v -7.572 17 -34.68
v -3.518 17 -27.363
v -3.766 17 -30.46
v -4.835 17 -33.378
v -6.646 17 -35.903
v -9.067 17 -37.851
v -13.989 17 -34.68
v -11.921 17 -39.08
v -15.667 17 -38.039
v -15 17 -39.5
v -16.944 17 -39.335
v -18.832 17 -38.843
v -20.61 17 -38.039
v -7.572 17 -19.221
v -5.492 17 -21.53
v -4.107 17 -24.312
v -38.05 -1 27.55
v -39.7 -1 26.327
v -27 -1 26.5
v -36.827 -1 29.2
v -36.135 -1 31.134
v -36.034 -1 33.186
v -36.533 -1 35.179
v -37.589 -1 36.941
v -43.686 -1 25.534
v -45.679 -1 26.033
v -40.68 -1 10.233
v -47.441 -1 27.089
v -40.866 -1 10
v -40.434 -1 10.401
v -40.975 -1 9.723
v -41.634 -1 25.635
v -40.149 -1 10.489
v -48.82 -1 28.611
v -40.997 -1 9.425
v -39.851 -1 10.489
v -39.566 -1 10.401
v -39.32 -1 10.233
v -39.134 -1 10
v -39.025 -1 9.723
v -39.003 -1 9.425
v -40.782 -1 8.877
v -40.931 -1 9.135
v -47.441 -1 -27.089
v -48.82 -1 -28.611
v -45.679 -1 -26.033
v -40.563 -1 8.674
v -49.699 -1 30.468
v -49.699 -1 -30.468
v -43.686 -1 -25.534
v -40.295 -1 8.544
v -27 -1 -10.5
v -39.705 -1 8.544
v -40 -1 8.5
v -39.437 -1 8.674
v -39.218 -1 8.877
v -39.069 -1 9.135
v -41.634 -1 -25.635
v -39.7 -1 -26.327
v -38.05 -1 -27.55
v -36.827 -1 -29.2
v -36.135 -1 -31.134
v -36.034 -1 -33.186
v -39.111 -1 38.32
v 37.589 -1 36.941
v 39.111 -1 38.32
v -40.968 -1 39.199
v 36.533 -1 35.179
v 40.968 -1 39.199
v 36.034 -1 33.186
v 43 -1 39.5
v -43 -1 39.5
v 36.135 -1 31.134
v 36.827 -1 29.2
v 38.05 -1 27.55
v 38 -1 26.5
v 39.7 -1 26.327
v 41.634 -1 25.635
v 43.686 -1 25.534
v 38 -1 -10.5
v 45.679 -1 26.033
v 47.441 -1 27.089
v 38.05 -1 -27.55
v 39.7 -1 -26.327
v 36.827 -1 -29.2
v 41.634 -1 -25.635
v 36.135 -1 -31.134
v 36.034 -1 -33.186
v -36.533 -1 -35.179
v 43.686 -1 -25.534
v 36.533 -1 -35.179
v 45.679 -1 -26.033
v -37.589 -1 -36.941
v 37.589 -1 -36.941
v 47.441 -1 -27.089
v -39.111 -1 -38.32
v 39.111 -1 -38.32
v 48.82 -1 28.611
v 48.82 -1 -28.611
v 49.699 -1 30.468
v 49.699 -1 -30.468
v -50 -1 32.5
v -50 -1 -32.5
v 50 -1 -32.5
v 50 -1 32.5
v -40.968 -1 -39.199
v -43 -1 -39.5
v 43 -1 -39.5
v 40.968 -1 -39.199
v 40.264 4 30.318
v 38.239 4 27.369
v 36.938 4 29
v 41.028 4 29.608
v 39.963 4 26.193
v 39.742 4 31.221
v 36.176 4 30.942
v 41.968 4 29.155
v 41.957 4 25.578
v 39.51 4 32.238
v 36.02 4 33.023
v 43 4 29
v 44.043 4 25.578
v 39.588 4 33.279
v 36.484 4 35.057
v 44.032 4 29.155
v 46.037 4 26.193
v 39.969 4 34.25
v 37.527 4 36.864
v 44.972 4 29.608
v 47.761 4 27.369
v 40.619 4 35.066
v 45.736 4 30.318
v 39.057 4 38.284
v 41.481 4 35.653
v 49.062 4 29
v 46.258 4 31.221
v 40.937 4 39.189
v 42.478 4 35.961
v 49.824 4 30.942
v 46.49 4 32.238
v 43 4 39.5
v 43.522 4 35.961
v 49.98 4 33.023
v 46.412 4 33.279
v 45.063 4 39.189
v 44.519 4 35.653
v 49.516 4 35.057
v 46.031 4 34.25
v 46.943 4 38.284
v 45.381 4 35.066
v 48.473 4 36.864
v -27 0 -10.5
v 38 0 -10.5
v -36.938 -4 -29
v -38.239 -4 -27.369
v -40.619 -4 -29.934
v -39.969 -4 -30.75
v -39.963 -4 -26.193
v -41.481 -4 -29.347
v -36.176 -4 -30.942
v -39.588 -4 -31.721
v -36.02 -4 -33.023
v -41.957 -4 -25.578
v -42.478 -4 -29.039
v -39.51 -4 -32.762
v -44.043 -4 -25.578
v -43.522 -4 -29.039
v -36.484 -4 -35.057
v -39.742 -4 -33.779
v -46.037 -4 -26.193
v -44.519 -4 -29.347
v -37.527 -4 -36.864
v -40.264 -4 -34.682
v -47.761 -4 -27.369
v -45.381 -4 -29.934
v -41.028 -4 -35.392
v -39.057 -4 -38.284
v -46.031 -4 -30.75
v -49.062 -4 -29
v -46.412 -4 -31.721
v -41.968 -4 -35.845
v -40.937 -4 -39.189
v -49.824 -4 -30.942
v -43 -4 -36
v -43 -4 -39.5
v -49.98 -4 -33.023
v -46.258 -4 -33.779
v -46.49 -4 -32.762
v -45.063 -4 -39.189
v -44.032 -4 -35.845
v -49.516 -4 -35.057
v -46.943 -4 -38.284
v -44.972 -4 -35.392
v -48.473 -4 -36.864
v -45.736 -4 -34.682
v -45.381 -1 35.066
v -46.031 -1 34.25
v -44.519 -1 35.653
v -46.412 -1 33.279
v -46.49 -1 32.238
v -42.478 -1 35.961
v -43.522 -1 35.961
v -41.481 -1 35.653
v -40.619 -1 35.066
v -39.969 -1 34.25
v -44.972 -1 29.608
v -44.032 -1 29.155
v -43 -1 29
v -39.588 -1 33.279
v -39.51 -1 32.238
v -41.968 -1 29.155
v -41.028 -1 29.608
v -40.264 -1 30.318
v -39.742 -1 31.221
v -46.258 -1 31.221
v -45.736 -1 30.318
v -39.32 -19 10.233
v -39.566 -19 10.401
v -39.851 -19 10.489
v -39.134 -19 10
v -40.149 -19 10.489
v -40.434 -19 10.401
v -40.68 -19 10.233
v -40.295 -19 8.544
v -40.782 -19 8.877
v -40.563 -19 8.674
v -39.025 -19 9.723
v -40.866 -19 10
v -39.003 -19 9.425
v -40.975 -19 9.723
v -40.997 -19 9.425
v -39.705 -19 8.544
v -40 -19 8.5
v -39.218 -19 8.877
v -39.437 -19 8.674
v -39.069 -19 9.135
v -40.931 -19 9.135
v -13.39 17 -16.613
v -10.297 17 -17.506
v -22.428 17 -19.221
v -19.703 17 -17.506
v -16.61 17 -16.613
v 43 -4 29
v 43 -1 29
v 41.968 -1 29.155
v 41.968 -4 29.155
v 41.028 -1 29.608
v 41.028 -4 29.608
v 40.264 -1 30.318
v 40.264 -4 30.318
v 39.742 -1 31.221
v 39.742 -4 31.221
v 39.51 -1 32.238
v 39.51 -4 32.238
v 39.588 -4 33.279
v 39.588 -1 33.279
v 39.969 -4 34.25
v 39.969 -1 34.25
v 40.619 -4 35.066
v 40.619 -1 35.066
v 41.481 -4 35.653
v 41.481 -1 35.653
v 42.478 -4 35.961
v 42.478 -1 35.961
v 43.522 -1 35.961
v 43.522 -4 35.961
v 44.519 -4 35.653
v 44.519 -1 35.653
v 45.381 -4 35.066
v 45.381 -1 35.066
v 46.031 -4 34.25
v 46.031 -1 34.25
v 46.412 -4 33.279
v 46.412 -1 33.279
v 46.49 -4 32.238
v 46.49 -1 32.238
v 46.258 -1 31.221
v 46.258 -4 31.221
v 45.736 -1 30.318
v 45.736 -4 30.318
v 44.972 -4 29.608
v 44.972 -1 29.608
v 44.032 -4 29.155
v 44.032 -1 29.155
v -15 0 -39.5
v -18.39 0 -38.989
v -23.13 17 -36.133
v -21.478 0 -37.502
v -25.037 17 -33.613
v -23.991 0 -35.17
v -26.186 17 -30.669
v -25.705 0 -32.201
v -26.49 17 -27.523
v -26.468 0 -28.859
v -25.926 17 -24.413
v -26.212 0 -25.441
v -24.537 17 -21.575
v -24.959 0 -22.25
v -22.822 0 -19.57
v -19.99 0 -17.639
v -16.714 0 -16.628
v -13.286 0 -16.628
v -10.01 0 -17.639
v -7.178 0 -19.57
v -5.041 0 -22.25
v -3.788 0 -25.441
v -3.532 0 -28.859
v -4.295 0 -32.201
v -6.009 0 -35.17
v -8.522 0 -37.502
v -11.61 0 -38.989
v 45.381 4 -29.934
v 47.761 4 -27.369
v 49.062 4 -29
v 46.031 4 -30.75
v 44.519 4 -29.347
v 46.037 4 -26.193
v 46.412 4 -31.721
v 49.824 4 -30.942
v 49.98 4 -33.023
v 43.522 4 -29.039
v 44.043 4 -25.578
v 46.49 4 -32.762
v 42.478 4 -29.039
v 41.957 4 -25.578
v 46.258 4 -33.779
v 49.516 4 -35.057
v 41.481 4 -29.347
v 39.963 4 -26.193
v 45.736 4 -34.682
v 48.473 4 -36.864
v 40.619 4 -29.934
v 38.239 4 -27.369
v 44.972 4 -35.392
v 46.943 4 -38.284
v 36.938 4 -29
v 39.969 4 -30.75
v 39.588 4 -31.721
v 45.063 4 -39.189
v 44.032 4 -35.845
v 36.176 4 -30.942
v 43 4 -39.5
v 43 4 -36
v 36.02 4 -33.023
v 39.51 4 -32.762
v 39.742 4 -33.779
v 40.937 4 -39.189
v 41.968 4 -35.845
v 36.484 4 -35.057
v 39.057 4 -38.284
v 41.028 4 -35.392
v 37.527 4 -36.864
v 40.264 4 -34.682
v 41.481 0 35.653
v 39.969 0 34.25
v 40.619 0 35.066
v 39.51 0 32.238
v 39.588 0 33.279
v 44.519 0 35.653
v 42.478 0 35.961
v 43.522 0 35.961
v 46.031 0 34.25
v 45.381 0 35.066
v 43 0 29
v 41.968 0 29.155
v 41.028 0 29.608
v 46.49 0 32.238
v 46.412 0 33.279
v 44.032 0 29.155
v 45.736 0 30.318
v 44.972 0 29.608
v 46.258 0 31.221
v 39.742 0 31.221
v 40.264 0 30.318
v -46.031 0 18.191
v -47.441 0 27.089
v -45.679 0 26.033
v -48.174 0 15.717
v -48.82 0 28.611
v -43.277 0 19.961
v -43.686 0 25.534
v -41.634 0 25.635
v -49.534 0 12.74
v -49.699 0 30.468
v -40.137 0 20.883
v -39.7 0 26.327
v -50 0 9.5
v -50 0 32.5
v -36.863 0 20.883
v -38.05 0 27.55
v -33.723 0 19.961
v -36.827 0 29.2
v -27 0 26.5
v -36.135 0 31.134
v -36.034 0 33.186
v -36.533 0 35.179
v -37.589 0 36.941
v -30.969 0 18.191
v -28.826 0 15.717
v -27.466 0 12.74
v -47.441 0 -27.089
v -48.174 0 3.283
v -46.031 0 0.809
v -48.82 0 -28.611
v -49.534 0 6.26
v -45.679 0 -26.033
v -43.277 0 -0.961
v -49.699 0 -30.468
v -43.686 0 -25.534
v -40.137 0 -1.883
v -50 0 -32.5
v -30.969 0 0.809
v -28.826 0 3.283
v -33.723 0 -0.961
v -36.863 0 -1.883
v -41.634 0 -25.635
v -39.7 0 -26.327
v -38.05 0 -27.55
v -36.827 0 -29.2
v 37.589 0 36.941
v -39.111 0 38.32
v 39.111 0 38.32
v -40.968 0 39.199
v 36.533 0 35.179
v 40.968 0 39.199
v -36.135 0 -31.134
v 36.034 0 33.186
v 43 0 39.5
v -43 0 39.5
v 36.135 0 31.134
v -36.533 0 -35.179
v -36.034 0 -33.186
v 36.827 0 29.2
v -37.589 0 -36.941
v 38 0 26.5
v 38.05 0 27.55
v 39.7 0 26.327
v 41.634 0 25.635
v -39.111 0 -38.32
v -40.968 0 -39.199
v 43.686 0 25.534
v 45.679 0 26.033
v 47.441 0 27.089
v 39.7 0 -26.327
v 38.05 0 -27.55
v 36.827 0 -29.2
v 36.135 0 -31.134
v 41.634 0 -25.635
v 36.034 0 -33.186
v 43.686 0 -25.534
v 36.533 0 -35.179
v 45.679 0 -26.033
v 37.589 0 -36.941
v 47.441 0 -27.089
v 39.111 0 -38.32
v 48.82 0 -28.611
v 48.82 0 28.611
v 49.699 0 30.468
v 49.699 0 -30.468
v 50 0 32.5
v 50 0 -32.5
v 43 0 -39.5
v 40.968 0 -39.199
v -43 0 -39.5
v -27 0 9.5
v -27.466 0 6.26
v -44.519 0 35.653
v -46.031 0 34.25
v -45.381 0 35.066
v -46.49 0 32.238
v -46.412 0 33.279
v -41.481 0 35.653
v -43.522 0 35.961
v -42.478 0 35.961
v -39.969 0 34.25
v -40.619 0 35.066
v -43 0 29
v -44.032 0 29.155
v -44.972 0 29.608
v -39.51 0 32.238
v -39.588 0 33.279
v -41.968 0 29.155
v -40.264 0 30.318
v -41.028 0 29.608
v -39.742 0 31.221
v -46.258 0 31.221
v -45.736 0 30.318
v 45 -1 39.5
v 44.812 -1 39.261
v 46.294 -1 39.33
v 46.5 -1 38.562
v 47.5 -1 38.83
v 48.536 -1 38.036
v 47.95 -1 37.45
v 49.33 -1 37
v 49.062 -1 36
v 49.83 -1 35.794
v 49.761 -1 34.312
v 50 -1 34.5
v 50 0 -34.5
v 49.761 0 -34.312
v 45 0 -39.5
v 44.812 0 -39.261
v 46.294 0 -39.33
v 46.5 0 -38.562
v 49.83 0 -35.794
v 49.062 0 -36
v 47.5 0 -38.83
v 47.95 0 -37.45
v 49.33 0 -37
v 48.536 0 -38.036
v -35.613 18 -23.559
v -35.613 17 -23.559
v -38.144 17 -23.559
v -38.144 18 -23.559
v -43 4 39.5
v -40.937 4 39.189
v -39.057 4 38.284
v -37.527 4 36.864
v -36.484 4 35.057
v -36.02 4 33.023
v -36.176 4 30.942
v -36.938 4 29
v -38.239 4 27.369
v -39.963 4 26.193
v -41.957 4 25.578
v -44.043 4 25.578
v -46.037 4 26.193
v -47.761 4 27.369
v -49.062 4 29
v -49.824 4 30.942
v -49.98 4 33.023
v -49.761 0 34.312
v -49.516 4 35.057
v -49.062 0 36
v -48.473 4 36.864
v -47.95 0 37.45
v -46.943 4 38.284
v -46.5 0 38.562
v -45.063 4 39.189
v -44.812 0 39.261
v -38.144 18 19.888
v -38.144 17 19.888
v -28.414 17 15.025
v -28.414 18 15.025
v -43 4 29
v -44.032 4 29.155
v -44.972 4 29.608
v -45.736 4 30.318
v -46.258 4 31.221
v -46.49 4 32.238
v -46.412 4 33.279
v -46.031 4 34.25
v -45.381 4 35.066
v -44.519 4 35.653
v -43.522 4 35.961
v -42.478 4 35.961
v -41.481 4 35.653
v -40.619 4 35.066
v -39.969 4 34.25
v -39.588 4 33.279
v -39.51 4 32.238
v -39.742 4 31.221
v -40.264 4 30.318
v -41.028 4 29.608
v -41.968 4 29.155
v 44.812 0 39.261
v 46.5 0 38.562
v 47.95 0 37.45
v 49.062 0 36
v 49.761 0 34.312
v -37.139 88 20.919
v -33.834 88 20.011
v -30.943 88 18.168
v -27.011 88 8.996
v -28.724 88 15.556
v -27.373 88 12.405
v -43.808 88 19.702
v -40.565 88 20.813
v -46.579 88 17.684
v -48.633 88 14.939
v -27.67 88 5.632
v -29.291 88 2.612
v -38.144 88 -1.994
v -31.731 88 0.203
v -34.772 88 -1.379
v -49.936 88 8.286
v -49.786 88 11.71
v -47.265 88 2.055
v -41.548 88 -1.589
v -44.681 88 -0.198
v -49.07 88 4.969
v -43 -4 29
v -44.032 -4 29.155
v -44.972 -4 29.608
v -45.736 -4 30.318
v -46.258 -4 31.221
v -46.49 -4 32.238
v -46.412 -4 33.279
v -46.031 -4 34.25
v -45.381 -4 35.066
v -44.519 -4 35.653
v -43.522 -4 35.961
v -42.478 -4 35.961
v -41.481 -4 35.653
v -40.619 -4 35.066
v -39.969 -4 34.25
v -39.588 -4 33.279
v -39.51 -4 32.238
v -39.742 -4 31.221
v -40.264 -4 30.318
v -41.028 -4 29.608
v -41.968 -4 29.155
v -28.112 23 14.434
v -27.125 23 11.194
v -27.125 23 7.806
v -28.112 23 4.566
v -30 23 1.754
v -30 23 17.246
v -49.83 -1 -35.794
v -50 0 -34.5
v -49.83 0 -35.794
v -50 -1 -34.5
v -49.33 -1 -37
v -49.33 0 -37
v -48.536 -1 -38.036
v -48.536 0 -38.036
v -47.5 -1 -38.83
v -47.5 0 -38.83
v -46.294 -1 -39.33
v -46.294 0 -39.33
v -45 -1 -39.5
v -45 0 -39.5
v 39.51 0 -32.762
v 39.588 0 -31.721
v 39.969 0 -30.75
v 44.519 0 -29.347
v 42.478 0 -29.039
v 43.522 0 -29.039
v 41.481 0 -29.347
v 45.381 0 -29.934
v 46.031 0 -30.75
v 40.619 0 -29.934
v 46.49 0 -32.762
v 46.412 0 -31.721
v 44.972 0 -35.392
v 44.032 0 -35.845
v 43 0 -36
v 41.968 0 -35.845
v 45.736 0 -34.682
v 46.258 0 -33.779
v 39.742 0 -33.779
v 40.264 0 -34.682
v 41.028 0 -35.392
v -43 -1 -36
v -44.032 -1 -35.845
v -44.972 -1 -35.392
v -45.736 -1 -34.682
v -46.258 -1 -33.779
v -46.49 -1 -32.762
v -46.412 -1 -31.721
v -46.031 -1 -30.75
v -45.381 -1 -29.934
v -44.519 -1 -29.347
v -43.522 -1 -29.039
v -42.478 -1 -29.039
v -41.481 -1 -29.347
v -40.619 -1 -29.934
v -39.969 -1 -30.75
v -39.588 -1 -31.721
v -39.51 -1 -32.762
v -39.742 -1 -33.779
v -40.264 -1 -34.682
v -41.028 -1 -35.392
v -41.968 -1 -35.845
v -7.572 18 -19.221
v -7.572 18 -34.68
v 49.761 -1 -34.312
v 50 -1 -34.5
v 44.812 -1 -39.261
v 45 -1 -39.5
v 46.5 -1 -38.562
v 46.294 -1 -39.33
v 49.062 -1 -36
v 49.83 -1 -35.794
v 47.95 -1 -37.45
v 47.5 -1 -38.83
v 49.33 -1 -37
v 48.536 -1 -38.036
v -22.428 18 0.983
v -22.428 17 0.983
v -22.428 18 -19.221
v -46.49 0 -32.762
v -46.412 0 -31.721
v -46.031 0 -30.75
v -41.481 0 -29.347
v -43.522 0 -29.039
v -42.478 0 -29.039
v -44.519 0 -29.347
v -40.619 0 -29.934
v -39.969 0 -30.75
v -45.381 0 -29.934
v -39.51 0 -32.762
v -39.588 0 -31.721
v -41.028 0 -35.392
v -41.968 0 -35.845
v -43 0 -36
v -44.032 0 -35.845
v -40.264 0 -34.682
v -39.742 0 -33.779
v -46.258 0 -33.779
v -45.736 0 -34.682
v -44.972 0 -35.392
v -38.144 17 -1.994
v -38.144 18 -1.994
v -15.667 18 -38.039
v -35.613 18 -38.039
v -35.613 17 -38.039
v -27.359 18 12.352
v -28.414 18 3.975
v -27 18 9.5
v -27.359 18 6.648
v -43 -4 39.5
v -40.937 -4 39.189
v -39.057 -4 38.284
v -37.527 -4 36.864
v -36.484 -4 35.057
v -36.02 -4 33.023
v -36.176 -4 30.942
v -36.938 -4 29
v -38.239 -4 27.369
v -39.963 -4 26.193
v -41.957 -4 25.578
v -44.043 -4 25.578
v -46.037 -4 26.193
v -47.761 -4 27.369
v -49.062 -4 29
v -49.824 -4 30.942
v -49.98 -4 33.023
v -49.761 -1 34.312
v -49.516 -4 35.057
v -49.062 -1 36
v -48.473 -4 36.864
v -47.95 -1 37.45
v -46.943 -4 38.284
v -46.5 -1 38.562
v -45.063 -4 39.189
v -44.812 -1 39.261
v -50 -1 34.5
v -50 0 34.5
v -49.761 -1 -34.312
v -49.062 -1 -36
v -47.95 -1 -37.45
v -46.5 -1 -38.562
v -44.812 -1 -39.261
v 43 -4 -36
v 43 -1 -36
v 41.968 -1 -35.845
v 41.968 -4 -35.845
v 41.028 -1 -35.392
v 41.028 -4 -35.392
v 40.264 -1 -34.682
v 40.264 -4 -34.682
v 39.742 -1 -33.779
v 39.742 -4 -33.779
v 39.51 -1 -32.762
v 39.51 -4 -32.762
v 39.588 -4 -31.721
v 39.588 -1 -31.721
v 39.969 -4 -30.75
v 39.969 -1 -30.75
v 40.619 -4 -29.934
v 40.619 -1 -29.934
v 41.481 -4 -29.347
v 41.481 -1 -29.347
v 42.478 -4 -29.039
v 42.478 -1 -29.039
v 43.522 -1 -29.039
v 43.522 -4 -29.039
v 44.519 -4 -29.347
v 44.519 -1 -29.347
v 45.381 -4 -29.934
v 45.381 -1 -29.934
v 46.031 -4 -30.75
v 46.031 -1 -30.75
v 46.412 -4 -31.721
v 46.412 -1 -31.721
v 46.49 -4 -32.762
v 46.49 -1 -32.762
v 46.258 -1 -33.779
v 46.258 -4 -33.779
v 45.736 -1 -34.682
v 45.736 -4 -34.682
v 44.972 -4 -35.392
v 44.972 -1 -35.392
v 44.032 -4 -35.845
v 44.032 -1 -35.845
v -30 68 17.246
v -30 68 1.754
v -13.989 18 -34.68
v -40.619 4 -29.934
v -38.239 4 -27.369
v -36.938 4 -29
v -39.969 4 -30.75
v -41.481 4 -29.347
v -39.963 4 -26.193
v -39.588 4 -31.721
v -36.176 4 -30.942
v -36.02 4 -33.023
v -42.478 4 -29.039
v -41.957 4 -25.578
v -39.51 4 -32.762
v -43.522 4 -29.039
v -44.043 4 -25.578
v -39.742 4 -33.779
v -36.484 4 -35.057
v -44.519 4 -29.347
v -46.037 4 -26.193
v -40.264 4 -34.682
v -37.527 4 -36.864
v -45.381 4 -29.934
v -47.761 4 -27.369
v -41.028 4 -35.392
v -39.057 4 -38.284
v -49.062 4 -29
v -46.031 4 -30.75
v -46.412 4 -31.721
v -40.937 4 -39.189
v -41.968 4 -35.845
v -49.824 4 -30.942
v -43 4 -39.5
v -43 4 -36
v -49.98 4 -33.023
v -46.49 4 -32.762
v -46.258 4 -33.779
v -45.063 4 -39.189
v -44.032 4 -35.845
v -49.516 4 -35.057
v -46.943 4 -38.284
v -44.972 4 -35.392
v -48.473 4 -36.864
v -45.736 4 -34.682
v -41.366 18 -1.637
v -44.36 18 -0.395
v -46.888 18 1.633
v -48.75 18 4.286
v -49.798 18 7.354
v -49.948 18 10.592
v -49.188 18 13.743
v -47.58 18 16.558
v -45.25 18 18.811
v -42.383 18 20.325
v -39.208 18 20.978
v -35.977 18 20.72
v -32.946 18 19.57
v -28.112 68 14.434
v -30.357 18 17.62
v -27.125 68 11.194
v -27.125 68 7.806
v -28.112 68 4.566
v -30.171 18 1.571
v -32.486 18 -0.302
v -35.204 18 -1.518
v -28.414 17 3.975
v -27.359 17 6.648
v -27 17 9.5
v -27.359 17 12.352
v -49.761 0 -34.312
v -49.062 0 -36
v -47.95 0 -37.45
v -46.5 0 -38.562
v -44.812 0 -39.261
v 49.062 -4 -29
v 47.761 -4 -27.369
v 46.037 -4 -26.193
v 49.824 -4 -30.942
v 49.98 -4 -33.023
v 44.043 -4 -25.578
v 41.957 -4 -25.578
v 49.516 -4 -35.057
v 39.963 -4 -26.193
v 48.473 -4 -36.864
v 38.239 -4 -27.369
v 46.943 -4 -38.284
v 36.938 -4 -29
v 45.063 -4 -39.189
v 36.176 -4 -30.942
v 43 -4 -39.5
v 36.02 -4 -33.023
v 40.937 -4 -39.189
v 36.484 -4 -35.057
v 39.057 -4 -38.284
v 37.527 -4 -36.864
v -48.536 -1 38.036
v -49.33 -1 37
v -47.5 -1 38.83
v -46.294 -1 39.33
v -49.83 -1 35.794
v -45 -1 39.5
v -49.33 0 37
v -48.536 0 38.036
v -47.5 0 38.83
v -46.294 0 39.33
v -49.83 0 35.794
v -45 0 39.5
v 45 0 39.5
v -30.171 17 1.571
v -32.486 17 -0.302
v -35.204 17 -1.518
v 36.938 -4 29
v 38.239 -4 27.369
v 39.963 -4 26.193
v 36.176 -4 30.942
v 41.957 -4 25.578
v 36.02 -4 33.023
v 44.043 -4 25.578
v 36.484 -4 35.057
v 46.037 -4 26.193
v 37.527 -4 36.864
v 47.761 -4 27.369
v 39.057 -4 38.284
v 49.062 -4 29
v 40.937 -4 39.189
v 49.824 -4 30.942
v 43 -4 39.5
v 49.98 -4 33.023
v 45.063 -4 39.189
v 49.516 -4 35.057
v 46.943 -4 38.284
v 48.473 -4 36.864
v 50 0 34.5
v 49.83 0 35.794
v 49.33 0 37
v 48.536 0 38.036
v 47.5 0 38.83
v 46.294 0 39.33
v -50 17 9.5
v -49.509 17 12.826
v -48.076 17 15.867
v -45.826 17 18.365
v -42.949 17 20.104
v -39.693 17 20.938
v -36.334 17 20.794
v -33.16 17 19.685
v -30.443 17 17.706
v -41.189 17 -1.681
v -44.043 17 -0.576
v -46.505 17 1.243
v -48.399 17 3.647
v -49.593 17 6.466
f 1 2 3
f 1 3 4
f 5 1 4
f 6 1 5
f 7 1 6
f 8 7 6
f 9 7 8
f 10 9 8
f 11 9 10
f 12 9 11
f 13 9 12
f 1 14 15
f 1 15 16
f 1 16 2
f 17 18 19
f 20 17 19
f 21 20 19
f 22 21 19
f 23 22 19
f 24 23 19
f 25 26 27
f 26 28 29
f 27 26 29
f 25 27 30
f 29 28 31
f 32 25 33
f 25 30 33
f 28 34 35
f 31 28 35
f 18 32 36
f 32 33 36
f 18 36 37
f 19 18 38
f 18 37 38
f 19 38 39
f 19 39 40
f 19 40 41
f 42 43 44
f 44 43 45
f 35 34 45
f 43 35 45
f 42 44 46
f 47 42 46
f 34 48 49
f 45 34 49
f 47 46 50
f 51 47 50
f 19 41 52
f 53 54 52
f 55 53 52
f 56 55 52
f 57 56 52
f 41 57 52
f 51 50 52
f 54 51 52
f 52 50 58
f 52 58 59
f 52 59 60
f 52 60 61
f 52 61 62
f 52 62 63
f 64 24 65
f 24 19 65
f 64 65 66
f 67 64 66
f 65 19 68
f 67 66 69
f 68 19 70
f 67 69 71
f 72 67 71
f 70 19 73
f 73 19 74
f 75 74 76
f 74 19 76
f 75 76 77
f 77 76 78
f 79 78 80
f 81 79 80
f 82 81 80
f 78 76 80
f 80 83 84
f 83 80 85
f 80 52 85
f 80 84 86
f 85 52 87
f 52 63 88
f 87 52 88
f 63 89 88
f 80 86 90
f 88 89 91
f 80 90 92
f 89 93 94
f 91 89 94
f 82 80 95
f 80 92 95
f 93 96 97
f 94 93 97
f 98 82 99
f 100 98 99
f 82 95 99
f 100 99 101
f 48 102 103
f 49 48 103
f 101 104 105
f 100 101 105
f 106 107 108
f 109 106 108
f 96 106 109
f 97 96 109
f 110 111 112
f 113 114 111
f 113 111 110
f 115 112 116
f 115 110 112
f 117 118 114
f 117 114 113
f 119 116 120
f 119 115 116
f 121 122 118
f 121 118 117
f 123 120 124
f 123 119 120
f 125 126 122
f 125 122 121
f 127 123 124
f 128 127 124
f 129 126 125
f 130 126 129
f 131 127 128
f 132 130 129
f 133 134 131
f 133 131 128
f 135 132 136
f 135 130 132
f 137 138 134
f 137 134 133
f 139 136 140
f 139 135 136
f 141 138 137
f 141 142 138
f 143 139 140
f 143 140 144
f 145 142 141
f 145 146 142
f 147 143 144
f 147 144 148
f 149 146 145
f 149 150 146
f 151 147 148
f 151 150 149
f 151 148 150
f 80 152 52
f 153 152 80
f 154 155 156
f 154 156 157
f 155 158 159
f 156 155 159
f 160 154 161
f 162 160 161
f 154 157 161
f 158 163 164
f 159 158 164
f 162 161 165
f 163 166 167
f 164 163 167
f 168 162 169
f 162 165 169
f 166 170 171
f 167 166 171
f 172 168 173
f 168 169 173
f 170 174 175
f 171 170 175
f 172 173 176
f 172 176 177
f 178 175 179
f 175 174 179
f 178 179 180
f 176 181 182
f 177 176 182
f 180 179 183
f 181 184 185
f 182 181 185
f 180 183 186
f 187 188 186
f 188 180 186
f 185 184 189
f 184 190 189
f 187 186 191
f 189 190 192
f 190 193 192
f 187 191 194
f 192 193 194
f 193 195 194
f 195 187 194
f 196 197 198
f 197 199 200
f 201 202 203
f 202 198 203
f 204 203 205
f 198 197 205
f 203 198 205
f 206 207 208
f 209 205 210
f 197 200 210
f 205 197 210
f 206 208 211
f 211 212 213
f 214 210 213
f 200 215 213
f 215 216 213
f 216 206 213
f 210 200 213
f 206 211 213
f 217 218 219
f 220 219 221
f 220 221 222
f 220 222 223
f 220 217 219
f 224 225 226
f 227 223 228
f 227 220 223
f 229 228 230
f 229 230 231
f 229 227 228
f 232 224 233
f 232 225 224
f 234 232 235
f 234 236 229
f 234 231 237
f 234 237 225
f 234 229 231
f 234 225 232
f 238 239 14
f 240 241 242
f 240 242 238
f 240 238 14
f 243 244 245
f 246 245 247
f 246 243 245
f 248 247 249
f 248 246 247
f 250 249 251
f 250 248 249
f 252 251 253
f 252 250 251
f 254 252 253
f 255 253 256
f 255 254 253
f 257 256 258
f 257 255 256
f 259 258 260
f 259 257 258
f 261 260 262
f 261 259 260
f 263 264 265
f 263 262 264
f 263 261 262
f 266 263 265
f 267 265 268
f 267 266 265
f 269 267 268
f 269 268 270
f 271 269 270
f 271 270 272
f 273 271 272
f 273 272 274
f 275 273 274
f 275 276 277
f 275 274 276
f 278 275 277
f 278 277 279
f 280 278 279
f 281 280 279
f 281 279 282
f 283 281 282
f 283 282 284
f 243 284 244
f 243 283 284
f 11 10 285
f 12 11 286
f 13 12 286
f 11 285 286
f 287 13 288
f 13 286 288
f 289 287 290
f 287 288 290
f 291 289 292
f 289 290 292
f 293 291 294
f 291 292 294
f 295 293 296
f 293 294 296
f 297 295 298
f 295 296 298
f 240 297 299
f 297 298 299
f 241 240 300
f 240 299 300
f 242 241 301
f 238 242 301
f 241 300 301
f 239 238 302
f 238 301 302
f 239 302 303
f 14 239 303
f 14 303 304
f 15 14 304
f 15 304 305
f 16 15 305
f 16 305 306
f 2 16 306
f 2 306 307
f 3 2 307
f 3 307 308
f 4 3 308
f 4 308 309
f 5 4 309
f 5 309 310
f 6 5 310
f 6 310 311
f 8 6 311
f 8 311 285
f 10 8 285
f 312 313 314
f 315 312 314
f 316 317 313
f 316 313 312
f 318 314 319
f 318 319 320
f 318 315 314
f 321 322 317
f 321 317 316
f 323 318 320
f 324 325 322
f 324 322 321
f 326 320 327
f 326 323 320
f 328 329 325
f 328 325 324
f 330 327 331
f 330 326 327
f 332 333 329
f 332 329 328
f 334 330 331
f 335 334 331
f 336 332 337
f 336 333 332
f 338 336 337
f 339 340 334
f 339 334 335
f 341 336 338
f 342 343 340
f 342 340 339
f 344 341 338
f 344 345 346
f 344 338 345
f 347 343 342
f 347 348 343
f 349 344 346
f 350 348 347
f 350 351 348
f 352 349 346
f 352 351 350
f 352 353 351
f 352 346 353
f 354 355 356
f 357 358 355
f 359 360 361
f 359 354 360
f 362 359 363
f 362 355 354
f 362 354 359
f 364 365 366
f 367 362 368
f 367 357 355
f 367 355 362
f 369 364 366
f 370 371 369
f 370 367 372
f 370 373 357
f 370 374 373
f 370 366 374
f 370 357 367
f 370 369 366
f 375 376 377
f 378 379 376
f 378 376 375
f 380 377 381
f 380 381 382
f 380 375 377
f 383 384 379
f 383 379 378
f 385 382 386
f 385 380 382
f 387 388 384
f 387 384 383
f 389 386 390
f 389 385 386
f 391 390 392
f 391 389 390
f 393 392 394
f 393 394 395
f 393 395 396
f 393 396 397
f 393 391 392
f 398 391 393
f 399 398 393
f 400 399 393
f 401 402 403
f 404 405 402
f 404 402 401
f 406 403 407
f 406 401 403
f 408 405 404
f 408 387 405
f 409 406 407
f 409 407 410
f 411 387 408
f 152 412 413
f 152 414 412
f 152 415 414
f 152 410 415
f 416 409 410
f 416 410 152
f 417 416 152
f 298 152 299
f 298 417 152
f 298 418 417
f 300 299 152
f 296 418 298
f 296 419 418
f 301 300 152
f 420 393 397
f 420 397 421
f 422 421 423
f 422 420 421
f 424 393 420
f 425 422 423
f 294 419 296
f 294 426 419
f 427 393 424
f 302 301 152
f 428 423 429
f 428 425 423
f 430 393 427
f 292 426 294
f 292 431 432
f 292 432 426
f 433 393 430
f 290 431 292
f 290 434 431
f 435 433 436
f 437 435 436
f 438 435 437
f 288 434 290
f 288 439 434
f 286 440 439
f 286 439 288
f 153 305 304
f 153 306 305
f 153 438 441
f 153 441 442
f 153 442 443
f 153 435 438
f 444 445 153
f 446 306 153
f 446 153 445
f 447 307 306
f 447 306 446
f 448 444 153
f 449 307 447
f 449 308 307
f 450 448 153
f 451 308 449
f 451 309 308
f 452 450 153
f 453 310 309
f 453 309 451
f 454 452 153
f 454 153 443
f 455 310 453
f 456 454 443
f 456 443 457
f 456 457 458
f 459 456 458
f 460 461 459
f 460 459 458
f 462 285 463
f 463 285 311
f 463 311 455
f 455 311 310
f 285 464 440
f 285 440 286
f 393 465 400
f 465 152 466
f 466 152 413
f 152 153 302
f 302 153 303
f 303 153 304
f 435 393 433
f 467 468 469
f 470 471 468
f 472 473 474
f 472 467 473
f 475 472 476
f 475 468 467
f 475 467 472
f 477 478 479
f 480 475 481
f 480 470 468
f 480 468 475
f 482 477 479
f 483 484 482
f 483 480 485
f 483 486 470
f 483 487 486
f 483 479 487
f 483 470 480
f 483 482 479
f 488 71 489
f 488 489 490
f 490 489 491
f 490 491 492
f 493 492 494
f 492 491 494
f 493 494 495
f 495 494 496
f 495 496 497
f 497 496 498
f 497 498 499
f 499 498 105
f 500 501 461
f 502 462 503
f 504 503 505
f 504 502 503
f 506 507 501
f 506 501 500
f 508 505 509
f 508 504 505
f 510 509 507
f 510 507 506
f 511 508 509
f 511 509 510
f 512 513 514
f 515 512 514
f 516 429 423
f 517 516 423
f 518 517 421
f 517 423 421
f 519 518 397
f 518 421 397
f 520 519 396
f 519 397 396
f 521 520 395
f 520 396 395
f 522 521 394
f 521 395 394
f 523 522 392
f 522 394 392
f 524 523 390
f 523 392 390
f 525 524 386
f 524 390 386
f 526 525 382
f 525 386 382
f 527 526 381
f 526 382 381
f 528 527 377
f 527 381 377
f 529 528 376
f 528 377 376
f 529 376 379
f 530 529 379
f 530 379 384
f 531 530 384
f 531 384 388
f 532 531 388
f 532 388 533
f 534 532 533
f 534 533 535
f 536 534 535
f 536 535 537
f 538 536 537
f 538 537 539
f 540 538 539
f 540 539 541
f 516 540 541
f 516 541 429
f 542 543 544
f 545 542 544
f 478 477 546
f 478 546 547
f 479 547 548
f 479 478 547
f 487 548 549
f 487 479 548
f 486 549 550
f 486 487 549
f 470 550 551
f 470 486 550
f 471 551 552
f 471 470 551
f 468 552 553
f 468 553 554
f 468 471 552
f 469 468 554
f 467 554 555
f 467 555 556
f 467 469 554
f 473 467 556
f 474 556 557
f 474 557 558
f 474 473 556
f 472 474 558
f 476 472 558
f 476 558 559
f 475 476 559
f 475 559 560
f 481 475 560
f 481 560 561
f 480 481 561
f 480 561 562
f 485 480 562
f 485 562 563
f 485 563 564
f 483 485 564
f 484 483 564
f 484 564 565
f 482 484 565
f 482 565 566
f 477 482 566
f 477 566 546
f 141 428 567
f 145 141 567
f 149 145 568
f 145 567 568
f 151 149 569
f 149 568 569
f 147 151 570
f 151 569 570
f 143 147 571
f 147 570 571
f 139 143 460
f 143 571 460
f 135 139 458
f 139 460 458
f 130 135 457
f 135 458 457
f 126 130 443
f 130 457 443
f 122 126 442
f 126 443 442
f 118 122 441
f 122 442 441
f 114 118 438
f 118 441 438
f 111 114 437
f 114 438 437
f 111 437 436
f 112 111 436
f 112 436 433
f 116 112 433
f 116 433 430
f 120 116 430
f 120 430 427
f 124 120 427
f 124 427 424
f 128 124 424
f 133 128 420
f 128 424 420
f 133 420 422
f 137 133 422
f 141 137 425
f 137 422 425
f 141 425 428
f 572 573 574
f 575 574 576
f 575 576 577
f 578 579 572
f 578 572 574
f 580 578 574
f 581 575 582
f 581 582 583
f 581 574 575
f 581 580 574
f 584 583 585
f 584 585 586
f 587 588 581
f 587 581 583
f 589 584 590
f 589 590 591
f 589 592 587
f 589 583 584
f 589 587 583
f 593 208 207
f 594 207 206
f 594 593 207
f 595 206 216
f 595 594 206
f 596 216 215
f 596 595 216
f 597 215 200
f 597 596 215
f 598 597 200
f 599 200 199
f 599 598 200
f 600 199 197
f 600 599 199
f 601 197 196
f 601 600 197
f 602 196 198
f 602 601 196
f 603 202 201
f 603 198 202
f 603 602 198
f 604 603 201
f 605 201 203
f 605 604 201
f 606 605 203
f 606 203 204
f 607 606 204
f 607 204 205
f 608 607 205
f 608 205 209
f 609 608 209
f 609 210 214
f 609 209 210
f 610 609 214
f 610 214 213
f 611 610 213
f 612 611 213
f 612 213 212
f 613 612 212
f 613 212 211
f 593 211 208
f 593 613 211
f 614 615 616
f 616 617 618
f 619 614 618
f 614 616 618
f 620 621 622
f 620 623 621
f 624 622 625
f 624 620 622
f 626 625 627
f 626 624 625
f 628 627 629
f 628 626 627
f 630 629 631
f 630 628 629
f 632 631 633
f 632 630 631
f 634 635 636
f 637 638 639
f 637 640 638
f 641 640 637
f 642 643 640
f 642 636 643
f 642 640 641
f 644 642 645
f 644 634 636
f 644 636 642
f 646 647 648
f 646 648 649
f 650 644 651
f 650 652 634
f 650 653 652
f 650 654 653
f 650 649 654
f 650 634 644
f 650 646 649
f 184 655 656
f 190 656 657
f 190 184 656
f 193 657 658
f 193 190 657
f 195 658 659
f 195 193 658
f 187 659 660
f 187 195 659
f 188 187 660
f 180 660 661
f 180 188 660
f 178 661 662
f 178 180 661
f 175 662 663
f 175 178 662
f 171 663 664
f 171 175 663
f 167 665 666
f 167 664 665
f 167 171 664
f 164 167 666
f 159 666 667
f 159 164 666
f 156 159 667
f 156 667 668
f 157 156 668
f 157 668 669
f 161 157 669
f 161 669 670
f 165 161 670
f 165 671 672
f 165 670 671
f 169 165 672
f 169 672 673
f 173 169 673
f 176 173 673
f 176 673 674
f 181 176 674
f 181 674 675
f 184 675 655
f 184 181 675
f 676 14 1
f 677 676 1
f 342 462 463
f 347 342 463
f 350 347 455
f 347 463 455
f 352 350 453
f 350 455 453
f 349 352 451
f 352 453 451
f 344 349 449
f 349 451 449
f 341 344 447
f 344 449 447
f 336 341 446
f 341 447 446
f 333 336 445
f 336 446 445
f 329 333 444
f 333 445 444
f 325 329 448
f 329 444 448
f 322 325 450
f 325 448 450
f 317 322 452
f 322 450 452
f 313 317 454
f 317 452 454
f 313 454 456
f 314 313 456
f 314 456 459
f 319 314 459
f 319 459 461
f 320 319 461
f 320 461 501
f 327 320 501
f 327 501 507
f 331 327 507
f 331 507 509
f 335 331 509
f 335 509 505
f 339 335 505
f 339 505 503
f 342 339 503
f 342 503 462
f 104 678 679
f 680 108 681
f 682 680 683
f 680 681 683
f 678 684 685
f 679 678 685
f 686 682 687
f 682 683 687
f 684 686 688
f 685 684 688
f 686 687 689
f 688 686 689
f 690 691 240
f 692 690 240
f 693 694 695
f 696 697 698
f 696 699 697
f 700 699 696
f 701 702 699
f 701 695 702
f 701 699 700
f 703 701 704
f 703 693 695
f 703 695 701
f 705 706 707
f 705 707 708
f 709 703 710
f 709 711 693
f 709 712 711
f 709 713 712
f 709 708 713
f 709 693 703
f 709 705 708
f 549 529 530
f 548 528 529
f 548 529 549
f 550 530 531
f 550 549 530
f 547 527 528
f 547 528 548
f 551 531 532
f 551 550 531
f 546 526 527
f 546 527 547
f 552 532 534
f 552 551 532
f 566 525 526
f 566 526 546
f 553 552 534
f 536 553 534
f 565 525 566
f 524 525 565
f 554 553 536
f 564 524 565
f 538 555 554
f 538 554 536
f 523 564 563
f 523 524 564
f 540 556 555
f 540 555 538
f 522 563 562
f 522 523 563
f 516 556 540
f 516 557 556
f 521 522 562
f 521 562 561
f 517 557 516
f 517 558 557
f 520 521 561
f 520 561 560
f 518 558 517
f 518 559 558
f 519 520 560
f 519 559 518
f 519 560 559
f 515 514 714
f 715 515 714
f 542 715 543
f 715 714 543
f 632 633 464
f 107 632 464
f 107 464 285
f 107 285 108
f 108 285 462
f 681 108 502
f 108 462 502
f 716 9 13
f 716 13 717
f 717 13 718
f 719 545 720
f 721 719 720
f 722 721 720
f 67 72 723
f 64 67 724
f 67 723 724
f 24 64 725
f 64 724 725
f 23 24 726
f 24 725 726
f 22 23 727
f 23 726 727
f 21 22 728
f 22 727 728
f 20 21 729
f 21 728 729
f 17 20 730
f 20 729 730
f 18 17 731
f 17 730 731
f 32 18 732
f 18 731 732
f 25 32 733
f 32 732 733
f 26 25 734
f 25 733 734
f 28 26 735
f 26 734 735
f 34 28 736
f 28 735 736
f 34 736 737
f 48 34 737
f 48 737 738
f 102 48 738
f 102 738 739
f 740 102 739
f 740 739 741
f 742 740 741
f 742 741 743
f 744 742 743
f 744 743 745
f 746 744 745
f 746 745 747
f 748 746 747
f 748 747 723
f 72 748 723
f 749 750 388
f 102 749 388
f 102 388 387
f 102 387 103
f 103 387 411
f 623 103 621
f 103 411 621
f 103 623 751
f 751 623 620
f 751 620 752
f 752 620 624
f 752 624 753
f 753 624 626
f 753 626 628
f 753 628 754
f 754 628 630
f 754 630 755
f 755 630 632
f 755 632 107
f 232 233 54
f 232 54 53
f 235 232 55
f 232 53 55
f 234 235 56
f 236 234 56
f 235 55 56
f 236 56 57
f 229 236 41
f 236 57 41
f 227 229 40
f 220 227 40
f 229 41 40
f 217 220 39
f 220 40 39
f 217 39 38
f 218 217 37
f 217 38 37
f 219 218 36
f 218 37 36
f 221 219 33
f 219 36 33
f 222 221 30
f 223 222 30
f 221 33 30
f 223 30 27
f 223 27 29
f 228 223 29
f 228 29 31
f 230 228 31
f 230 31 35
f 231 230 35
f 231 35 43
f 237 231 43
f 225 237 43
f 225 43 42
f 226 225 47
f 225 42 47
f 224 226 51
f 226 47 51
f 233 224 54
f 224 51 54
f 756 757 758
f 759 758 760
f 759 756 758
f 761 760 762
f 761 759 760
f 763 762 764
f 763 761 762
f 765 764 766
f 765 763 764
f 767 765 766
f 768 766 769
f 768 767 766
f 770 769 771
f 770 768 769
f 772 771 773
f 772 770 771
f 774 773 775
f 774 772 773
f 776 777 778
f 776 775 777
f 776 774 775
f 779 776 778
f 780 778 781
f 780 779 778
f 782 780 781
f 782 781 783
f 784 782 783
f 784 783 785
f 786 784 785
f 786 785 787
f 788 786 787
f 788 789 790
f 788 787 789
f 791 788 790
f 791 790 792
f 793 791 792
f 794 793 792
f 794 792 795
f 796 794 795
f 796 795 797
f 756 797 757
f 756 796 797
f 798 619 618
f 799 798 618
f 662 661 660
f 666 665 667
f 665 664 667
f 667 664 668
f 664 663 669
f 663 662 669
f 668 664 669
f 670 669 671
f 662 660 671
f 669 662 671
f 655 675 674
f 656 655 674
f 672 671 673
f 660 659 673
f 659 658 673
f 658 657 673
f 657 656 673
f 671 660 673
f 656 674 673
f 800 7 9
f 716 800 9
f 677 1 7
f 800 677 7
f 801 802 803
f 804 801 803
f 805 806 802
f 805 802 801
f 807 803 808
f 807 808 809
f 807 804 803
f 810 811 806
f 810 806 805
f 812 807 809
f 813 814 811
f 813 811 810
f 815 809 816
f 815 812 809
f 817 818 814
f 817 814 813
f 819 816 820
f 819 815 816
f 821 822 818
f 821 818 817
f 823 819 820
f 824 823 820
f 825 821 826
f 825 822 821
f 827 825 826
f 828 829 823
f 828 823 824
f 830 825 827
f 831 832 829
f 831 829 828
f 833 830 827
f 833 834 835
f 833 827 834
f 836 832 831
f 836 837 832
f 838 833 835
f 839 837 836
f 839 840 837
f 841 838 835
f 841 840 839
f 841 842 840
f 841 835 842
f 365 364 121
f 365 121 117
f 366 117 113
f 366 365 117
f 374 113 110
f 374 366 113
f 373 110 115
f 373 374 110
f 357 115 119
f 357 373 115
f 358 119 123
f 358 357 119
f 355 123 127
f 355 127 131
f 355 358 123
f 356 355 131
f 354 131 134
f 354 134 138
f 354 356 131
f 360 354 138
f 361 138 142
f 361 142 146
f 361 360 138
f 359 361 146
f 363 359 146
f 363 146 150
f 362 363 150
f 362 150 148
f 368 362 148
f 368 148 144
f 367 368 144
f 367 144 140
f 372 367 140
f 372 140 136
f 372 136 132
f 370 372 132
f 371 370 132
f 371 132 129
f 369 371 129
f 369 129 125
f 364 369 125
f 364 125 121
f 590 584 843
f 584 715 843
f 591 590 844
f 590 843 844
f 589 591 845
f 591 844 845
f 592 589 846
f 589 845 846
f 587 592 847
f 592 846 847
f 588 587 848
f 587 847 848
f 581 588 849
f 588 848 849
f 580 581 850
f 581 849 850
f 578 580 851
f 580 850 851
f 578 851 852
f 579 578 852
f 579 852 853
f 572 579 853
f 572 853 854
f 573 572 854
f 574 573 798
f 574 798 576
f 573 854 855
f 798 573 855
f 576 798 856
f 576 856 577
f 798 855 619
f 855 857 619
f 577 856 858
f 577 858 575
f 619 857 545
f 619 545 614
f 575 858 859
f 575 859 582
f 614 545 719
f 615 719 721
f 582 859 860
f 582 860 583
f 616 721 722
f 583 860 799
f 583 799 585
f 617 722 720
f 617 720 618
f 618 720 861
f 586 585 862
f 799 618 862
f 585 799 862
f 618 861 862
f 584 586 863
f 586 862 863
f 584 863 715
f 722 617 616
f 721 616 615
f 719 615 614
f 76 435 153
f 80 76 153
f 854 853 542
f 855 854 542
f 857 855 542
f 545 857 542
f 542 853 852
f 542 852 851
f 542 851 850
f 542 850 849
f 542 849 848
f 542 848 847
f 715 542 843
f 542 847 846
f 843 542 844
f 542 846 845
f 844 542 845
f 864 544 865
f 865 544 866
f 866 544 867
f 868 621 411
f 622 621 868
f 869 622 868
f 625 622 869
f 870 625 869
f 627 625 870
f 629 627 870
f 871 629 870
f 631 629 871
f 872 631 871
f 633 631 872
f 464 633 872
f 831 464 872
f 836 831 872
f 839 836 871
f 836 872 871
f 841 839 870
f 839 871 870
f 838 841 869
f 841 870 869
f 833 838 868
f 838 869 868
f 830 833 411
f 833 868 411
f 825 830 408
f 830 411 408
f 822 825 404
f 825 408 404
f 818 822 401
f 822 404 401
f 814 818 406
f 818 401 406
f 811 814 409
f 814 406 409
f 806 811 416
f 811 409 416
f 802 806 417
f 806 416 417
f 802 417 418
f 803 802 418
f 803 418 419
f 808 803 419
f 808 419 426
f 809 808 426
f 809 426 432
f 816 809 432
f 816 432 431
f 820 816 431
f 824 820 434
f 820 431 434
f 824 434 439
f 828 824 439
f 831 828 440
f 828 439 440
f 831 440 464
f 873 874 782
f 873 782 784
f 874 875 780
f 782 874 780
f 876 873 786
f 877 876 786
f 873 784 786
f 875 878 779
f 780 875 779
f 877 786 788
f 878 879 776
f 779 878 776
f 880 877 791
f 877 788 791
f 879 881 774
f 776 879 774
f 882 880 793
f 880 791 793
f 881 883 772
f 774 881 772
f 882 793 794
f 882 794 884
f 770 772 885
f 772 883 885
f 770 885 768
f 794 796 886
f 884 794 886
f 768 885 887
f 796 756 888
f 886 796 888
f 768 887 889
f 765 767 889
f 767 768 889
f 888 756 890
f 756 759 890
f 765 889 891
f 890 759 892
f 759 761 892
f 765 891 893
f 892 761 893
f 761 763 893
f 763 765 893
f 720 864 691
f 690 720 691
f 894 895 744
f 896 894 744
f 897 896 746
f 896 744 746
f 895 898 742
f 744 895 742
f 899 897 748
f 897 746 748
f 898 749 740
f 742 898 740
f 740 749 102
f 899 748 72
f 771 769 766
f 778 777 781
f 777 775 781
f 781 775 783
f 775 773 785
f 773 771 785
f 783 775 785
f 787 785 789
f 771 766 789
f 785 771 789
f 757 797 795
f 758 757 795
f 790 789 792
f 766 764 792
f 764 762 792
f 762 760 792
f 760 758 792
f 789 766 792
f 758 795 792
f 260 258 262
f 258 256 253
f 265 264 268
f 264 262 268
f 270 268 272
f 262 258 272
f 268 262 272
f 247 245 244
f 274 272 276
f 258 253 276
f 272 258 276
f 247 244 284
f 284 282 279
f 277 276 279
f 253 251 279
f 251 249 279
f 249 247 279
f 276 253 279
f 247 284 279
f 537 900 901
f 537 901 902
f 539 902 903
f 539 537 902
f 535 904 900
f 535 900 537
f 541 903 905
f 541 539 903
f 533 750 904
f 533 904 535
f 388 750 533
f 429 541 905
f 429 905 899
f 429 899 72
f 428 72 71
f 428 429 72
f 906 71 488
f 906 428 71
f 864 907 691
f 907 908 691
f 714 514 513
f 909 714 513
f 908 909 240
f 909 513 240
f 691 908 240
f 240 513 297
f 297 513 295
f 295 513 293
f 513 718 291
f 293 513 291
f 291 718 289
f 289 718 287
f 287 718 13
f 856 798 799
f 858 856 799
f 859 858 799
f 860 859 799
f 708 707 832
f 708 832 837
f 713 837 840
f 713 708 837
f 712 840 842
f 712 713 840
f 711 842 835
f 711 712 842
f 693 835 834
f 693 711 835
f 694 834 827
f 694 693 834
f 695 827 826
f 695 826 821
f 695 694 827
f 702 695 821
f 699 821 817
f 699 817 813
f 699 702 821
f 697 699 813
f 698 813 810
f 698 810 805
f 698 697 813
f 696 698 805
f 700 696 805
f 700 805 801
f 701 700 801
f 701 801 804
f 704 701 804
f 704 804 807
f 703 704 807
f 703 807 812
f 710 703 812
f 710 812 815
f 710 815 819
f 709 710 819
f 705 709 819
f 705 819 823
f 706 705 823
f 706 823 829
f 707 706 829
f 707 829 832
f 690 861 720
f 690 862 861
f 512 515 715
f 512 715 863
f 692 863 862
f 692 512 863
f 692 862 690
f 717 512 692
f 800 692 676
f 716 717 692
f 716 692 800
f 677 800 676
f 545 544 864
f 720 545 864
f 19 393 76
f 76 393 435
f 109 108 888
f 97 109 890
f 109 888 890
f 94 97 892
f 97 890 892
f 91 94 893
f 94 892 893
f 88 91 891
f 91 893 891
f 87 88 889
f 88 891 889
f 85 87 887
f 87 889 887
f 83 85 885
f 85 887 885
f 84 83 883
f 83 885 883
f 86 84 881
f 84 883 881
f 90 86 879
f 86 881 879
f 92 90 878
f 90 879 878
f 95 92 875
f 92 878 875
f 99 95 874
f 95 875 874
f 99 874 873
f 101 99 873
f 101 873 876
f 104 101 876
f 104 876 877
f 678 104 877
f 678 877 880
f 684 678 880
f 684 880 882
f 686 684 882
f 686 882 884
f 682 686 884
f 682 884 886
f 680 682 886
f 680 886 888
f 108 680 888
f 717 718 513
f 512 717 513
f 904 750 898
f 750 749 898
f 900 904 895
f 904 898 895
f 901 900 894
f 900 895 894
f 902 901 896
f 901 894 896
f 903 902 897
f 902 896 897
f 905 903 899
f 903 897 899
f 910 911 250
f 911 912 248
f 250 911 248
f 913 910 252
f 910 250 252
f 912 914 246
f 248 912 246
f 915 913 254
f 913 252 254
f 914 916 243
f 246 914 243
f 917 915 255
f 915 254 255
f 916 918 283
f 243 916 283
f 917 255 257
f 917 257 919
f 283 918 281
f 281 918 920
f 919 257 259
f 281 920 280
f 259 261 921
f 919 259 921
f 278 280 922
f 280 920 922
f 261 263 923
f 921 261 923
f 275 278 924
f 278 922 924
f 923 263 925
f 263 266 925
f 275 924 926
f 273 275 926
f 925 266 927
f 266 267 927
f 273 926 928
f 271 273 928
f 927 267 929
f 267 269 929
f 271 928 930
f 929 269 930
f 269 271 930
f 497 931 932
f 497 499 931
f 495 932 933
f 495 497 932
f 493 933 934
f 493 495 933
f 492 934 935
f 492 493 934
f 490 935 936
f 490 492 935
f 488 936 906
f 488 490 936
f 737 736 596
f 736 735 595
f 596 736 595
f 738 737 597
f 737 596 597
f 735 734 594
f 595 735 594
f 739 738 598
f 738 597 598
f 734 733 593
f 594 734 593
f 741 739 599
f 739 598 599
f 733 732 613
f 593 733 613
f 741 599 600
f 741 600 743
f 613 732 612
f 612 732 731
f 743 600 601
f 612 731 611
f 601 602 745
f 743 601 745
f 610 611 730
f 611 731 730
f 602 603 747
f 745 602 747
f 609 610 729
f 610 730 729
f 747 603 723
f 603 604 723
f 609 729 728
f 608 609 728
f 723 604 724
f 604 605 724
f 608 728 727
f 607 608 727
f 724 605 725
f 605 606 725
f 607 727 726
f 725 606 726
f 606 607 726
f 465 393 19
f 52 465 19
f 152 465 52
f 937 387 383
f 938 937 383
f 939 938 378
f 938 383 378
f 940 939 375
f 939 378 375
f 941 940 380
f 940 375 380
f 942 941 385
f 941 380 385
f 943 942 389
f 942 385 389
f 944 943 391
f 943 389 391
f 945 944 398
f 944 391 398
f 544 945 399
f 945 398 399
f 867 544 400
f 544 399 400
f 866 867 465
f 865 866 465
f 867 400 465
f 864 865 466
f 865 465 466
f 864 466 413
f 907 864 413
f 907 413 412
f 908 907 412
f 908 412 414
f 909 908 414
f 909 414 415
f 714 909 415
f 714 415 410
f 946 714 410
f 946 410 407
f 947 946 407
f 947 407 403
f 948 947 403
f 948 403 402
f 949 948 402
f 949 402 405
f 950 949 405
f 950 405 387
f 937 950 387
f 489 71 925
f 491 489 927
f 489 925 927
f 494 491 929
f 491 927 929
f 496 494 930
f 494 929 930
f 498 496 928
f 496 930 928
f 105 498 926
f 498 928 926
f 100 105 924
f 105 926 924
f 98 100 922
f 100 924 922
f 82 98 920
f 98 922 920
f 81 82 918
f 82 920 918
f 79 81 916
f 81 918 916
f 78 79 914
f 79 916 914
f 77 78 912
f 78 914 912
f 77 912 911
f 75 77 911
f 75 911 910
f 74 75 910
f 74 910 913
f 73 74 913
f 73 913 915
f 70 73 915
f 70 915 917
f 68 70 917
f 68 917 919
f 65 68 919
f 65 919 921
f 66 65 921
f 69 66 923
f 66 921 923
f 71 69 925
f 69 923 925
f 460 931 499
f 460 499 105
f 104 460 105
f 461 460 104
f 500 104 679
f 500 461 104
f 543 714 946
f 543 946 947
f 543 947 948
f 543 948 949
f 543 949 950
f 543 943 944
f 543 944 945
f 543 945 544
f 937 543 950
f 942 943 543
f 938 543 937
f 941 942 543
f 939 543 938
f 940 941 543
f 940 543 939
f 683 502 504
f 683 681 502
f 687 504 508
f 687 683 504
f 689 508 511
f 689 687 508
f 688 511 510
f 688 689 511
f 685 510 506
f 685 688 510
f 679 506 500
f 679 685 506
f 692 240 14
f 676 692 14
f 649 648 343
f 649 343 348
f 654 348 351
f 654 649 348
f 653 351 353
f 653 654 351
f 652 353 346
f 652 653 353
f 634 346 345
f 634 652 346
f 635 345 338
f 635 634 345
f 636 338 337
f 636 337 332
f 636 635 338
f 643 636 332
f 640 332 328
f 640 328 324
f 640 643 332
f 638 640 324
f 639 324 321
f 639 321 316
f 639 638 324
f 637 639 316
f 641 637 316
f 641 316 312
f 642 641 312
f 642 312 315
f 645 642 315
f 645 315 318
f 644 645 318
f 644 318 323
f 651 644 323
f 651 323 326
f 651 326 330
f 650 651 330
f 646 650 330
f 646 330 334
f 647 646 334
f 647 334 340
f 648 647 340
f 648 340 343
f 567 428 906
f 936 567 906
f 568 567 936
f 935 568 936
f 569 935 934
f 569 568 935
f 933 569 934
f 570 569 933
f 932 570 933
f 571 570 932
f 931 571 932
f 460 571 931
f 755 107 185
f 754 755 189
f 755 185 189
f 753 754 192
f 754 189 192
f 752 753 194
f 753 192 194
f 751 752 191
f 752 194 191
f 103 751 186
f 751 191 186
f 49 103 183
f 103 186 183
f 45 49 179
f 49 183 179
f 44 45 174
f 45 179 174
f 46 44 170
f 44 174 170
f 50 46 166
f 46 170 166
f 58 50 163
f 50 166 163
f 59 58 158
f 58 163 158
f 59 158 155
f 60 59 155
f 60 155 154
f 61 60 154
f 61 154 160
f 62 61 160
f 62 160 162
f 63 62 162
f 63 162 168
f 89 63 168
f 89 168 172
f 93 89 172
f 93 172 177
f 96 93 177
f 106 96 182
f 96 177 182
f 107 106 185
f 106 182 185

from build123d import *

# Parameters (mm, degrees)
ESQUISSE4_W             = 100
ESQUISSE4_H             = 79
BOSS_EXTRU_3_DEPTH      = 1
BOSS_EXTRU_4_DEPTH      = 4
BOSS_EXTRU_4_DEPTH_BACK = 4
ESQUISSE1_R             = 7
ESQUISSE1_R_2           = 3.5
ESQUISSE6_R             = 11.5
BOSS_EXTRU_5_DEPTH      = 17
BOSS_EXTRU_6_DEPTH      = 1
ESQUISSE8_W             = 65
ESQUISSE8_H             = 37
ENL_V_MAT_EXTRU_1_DEPTH = 1
ESQUISSE9_R             = 1
BOSS_EXTRU_7_DEPTH      = 18
ESQUISSE10_R            = 11.5
BOSS_EXTRU_8_DEPTH      = 50
CONG_2_R                = 5
ENL_V_START             = -45
ENL_V_MAT_EXTRU_3_DEPTH = 45
ESQUISSE12_R            = 11.5
BOSS_EXTRU_9_DEPTH      = 20


with BuildPart() as part:
    # Esquisse4 → Boss.-Extru.3 (new body)
    with BuildSketch(Plane(origin=(0, 0, 0), x_dir=(1, 0, 0), z_dir=(0, 1, 0))):
        Rectangle(ESQUISSE4_W, ESQUISSE4_H)
    extrude(amount=-BOSS_EXTRU_3_DEPTH)

    # Esquisse1 → Boss.-Extru.4 (add, two sides: drawn at the far end of the back side and taken through both)
    # profile 1 of 4: a face of its own
    with BuildSketch(Plane(origin=(0, 0, 0), x_dir=(1, 0, 0), z_dir=(0, 1, 0)).offset(-BOSS_EXTRU_4_DEPTH_BACK)):
        with Locations((-43, -32.5)):
            Circle(ESQUISSE1_R)
        with Locations((-43, -32.5)):
            Circle(ESQUISSE1_R_2, mode=Mode.SUBTRACT)
    # profile 2 of 4: a face of its own
    with BuildSketch(Plane(origin=(0, 0, 0), x_dir=(1, 0, 0), z_dir=(0, 1, 0)).offset(-BOSS_EXTRU_4_DEPTH_BACK)):
        with Locations((43, -32.5)):
            Circle(ESQUISSE1_R)
        with Locations((43, -32.5)):
            Circle(ESQUISSE1_R_2, mode=Mode.SUBTRACT)
    # profile 3 of 4: a face of its own
    with BuildSketch(Plane(origin=(0, 0, 0), x_dir=(1, 0, 0), z_dir=(0, 1, 0)).offset(-BOSS_EXTRU_4_DEPTH_BACK)):
        with Locations((-43, 32.5)):
            Circle(ESQUISSE1_R)
        with Locations((-43, 32.5)):
            Circle(ESQUISSE1_R_2, mode=Mode.SUBTRACT)
    # profile 4 of 4: a face of its own
    with BuildSketch(Plane(origin=(0, 0, 0), x_dir=(1, 0, 0), z_dir=(0, 1, 0)).offset(-BOSS_EXTRU_4_DEPTH_BACK)):
        with Locations((43, 32.5)):
            Circle(ESQUISSE1_R)
        with Locations((43, 32.5)):
            Circle(ESQUISSE1_R_2, mode=Mode.SUBTRACT)
    extrude(amount=BOSS_EXTRU_4_DEPTH + BOSS_EXTRU_4_DEPTH_BACK)

    # Esquisse6 → Boss.-Extru.5 (add)
    with BuildSketch(Plane(origin=(0, 0, 0), x_dir=(1, 0, 0), z_dir=(0, 1, 0))):
        with Locations((-38.5, -9.5)):
            Circle(ESQUISSE6_R)
        with Locations((-15, 28)):
            Circle(ESQUISSE6_R)
    extrude(amount=BOSS_EXTRU_5_DEPTH)

    # Esquisse7 → Boss.-Extru.6 (add)
    with BuildSketch(Plane(origin=(0, 17, 0), x_dir=(1, 0, 0), z_dir=(0, 1, 0))):
        Polygon((-38.143774149, -19.88751618), (-28.414215556, -15.025120102), (-28.414215556, -3.974879898), (-22.428299765, -0.98338823), (-22.428299765, 19.221027247), (-7.571700235, 19.221027247), (-7.571700235, 34.680148422), (-13.988712335, 34.680148422), (-15.667356388, 38.039082045), (-35.613243864, 38.039082045), (-35.613243864, 23.559466539), (-38.143774149, 23.559466539), (-38.143774149, 0), align=None)
    extrude(amount=BOSS_EXTRU_6_DEPTH)

    # Esquisse8 → Enlèv. mat.-Extru.1 (cut)
    with BuildSketch(Plane(origin=(0, 0, 0), x_dir=(1, 0, 0), z_dir=(0, 1, 0))):
        with Locations((5.5, -8)):
            Rectangle(ESQUISSE8_W, ESQUISSE8_H)
    extrude(amount=-ENL_V_MAT_EXTRU_1_DEPTH, mode=Mode.SUBTRACT)

    # Esquisse9 → Boss.-Extru.7 (add)
    with BuildSketch(Plane.XZ.offset(1)):
        with Locations((-40, 9.5)):
            Circle(ESQUISSE9_R)
    extrude(amount=BOSS_EXTRU_7_DEPTH)

    # Esquisse10 → Boss.-Extru.8 (add)
    with BuildSketch(Plane(origin=(0, 18, 0), x_dir=(1, 0, 0), z_dir=(0, 1, 0))):
        with Locations((-38.5, -9.5)):
            Circle(ESQUISSE10_R)
    extrude(amount=BOSS_EXTRU_8_DEPTH)

    # Congé2
    cong_2_edges = [part.edges().sort_by_distance(p)[0] for p in [
        (-50, -0.5, 39.5),
        (50, -0.5, 39.5),
        (50, -0.5, -39.5),
        (-50, -0.5, -39.5),
    ]]
    fillet(cong_2_edges, radius=CONG_2_R)

    # Esquisse11 → Enlèv. mat.-Extru.3 (cut)
    with BuildSketch(Plane(origin=(0, 68, 0), x_dir=(1, 0, 0), z_dir=(0, 1, 0)).offset(ENL_V_START)):
        with BuildLine():
            Line((-30, -17.245966692), (-30, -1.754033308))
            ThreePointArc((-30, -1.754033308), (-27, -9.5), (-30, -17.245966692))
        make_face()
    extrude(amount=ENL_V_MAT_EXTRU_3_DEPTH, mode=Mode.SUBTRACT)

    # Esquisse12 → Boss.-Extru.9 (add)
    with BuildSketch(Plane(origin=(0, 68, 0), x_dir=(1, 0, 0), z_dir=(0, 1, 0))):
        with Locations((-38.5, -9.5)):
            Circle(ESQUISSE12_R)
    extrude(amount=BOSS_EXTRU_9_DEPTH)


solid = part.part
